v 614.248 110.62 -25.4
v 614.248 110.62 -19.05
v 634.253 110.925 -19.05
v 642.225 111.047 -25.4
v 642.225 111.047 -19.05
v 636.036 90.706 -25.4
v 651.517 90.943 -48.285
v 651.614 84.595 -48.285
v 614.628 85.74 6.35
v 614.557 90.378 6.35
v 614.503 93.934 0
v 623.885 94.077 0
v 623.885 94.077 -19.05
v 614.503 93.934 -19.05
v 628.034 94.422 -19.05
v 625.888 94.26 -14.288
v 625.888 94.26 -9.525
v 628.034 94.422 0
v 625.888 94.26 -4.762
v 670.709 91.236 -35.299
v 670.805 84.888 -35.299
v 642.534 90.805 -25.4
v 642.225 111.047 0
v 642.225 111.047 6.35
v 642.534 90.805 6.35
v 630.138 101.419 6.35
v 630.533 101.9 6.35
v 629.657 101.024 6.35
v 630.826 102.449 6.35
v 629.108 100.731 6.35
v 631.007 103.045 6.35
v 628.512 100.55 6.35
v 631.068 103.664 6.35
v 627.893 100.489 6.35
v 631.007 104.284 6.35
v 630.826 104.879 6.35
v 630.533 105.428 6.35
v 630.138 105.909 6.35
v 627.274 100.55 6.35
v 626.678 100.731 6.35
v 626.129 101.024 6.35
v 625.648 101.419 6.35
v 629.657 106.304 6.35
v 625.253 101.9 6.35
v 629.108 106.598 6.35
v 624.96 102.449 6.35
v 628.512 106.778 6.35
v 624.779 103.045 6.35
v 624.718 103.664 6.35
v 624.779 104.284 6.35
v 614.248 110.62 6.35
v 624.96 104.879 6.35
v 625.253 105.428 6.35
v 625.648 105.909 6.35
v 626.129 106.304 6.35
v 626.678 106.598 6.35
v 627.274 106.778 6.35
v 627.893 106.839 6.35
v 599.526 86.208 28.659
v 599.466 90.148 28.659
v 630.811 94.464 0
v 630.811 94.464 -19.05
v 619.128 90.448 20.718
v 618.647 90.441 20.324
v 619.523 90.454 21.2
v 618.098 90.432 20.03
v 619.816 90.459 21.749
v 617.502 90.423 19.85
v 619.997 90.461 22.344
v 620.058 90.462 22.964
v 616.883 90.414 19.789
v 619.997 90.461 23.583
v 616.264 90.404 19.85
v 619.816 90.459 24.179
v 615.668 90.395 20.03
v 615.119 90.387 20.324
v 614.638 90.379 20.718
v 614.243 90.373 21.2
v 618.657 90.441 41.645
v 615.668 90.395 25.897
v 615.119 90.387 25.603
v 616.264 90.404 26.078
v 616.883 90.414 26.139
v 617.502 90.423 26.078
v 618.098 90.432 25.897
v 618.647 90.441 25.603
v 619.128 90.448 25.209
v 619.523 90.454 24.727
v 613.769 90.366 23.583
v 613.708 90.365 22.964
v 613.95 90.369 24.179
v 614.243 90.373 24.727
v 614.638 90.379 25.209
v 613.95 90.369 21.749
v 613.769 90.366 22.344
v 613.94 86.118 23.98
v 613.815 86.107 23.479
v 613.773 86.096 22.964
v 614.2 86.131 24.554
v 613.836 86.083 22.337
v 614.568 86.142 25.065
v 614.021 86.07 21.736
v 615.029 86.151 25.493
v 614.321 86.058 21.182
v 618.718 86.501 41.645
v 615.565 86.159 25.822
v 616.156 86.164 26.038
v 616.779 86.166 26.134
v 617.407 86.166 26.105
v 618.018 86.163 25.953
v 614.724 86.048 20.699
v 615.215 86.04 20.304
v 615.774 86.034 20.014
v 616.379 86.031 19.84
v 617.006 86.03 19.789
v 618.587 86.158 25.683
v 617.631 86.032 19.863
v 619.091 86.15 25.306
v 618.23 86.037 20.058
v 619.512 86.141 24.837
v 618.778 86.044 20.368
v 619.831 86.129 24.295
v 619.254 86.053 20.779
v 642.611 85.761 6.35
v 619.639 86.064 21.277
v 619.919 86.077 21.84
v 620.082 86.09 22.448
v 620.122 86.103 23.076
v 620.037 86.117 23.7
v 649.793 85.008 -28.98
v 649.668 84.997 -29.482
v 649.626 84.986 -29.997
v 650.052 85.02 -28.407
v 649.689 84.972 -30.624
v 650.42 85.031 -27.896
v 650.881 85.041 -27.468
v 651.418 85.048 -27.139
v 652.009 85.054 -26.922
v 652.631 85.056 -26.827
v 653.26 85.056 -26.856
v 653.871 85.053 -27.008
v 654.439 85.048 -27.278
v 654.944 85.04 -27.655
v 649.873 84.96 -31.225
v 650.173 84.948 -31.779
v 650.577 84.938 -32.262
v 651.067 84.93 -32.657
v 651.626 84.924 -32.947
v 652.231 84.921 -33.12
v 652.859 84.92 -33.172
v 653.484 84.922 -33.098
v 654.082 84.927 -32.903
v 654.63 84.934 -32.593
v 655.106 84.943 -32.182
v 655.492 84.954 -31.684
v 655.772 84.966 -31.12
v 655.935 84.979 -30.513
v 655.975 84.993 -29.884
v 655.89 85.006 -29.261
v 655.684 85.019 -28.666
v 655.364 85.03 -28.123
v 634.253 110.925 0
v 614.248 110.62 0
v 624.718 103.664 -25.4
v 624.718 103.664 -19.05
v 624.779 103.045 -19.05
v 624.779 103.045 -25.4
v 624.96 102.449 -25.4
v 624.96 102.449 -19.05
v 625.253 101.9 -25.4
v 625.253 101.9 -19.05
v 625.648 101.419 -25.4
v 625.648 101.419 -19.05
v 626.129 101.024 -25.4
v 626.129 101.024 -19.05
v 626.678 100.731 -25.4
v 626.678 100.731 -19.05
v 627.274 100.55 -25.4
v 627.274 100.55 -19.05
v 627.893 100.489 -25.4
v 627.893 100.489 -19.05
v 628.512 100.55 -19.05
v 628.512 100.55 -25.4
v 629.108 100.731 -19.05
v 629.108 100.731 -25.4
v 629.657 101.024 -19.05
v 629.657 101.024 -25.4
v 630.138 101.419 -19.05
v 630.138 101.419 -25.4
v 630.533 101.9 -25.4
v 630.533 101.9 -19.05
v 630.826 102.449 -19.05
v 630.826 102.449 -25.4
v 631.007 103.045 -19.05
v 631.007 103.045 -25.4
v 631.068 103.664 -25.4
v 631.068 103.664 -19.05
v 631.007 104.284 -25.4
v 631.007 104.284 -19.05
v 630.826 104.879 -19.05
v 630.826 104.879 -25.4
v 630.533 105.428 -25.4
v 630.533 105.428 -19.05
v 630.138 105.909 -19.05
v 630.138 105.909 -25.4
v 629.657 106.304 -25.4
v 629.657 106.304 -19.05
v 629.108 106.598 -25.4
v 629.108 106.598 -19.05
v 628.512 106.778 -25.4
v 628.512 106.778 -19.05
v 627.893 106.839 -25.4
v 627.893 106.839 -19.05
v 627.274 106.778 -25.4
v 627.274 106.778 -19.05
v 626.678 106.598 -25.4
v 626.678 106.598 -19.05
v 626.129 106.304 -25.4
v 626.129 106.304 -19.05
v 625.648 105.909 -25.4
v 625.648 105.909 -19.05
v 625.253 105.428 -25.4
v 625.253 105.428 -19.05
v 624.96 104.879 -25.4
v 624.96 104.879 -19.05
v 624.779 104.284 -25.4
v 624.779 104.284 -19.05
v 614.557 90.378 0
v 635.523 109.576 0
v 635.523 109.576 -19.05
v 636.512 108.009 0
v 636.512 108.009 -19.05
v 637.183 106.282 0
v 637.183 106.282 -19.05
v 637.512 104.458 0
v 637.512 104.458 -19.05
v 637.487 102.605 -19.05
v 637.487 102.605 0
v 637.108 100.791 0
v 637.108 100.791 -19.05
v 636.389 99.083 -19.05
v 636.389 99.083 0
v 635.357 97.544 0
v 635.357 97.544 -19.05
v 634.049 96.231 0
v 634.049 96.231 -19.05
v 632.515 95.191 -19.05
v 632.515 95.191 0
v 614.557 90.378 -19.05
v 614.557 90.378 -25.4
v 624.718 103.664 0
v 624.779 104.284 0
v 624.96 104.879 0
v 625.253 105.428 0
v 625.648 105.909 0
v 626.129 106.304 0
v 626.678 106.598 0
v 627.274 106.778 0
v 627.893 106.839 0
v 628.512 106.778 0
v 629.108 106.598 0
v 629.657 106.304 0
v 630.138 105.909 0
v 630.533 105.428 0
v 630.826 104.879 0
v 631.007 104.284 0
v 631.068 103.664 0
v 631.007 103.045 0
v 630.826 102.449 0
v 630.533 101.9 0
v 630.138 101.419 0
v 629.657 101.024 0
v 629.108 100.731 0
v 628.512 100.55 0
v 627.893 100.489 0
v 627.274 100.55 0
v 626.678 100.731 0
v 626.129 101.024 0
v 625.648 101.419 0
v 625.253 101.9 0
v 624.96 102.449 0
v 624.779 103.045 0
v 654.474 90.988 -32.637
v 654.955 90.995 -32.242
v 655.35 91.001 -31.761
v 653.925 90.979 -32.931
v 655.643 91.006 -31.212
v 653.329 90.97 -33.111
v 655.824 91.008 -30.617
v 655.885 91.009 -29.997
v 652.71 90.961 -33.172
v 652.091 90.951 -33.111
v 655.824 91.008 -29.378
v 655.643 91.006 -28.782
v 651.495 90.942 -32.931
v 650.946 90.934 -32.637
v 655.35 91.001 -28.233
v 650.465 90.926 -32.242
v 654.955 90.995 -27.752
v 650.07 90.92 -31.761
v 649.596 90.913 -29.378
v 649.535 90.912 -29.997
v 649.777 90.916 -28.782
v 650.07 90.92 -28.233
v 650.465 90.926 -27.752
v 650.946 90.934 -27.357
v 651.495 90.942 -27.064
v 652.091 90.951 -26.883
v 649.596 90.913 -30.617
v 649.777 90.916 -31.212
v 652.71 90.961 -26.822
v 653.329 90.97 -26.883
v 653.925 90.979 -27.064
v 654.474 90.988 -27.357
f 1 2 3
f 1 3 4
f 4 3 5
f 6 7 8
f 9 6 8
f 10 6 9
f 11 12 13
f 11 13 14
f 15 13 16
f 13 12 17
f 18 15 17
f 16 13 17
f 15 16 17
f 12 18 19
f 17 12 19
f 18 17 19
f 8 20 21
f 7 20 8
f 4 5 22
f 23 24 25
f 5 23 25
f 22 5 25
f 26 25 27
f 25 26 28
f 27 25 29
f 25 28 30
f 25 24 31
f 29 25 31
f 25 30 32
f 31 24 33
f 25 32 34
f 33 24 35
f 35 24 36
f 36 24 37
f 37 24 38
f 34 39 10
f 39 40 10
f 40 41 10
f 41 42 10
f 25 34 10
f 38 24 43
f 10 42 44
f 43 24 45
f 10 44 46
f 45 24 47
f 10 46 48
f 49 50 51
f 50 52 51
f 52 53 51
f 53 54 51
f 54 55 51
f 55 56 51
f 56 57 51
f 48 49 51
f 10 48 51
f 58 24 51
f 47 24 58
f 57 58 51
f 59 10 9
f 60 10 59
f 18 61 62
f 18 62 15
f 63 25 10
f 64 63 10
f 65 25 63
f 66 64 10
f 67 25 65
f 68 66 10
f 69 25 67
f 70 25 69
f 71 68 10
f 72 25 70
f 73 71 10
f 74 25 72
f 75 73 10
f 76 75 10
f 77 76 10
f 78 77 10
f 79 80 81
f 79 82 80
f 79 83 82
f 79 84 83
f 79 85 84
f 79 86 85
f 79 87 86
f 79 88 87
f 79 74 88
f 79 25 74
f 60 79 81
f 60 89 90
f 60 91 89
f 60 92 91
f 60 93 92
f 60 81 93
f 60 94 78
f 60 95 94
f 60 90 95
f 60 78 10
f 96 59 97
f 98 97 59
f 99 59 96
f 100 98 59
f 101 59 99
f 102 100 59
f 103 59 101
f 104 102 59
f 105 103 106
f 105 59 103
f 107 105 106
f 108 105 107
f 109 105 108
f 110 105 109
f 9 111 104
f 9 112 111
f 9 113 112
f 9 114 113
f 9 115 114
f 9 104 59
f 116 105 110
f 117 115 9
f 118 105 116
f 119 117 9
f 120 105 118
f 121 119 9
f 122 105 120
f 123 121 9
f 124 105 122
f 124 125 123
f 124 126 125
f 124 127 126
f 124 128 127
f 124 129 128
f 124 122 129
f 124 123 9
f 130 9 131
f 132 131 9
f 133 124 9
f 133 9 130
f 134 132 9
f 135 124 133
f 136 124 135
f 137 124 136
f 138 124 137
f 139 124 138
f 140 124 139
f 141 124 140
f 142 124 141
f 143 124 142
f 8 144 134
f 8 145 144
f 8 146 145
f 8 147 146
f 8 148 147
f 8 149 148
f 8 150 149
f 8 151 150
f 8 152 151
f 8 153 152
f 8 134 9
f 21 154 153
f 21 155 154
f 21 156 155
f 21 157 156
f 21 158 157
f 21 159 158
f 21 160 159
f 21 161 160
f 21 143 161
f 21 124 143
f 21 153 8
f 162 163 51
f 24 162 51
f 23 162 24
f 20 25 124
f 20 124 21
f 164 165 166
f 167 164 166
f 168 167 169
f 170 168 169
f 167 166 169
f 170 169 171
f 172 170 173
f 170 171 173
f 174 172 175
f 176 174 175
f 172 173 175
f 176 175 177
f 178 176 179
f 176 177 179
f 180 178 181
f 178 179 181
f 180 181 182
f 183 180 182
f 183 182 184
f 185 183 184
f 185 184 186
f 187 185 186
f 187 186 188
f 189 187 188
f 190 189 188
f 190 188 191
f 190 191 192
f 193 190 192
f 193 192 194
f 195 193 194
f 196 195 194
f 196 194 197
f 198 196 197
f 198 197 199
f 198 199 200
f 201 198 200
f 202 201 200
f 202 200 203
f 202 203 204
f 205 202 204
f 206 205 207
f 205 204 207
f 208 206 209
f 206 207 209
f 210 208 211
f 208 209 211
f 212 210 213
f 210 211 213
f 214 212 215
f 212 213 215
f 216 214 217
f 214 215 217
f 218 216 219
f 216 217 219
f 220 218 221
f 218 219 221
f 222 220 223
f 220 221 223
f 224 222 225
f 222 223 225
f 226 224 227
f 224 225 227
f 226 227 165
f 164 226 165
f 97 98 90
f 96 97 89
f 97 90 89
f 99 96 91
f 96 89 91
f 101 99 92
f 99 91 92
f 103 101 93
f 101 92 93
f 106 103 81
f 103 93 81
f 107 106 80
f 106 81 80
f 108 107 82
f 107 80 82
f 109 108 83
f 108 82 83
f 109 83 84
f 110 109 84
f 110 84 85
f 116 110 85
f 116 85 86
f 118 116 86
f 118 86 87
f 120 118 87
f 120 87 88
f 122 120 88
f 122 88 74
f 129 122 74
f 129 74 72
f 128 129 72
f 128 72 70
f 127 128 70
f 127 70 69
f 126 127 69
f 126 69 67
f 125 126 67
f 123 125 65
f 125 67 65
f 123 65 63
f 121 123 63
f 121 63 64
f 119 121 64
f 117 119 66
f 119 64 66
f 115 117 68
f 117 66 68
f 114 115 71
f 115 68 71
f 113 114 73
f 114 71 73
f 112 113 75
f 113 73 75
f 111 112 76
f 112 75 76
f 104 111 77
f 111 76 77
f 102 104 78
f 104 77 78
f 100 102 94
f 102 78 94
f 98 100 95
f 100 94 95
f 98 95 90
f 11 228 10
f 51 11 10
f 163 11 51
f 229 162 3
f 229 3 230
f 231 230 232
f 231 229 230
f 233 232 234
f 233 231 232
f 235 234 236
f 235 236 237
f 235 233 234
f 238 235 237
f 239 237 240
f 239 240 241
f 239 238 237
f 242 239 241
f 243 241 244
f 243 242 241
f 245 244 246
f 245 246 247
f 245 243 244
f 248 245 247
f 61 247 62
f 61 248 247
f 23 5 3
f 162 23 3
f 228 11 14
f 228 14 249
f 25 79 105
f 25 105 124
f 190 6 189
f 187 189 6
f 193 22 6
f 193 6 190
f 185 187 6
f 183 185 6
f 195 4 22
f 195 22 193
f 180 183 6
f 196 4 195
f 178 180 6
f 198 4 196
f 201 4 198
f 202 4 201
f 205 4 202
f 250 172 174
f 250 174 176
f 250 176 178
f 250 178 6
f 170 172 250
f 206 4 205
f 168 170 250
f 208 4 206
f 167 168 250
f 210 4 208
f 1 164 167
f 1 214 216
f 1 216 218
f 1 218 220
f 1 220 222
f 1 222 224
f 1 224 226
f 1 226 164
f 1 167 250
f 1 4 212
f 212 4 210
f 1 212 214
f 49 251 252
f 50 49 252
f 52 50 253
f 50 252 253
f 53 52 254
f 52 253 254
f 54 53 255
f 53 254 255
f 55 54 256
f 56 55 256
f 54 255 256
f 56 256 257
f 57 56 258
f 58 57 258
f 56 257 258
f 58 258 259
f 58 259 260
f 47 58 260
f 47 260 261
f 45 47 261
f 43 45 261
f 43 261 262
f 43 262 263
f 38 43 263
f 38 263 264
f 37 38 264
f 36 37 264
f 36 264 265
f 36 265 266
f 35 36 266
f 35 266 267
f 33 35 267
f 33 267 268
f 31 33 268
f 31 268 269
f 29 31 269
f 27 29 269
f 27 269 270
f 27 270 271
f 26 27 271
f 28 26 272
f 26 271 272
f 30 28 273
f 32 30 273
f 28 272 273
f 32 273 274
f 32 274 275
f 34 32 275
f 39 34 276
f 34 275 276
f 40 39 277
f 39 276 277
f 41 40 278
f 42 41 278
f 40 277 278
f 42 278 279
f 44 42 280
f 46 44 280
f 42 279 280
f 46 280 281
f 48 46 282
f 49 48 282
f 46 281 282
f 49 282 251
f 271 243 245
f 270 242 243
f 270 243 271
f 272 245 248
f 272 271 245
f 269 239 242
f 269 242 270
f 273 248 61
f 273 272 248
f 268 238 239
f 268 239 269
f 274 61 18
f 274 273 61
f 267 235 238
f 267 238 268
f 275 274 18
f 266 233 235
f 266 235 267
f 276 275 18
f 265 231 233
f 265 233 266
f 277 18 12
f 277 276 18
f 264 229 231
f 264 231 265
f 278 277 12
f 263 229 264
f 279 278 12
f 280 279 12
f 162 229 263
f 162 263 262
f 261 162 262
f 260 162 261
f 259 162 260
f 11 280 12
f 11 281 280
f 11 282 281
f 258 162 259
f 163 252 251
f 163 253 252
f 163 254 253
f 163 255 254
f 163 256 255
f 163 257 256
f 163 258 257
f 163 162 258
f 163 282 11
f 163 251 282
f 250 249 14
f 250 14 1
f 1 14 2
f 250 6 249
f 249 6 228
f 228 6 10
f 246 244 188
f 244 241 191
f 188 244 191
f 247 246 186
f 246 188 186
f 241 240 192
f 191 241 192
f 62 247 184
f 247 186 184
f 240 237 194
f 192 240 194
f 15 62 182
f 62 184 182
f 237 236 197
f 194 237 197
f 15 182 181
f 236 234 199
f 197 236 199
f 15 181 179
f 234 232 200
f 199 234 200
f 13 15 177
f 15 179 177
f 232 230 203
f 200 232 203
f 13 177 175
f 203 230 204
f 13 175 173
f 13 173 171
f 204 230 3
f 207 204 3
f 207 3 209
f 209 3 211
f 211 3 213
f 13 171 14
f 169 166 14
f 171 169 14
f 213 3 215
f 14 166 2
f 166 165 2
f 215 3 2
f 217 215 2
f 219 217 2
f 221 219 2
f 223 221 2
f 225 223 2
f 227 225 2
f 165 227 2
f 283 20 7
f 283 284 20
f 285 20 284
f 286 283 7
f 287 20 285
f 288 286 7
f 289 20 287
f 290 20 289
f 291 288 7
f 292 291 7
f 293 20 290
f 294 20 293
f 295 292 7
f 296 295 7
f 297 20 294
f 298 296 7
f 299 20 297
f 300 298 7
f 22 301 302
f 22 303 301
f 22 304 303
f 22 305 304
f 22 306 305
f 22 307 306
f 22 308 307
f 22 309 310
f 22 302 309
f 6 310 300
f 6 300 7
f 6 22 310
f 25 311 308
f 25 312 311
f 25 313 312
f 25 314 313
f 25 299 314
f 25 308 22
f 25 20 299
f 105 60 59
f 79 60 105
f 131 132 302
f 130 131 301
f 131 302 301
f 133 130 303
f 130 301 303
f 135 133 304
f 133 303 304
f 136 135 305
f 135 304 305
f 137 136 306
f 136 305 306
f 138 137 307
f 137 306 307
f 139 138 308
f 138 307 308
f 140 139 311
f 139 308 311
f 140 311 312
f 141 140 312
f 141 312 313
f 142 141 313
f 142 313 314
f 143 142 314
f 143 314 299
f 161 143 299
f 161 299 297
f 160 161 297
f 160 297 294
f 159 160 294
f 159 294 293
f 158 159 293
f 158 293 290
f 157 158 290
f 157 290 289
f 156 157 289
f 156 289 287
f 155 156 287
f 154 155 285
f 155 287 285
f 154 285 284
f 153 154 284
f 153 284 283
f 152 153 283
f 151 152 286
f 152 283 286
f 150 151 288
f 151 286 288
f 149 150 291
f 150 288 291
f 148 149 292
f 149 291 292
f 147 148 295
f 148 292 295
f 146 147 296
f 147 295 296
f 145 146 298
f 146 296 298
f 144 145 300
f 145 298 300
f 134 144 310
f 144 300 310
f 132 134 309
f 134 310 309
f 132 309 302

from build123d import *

# Parameters (mm, degrees)
BOSS_EXTRUDE2_DEPTH = 19.05
BOSS_EXTRUDE3_DEPTH = 6.35
BOSS_EXTRUDE4_DEPTH = 6.35
SKETCH5_R           = 3.175
CUT_EXTRUDE1_DEPTH  = 653.553447442
SKETCH6_R           = 3.175
CUT_EXTRUDE2_DEPTH  = 653.553447442
BOSS_EXTRUDE7_DEPTH = 7.874
SKETCH12_R          = 3.175
CUT_EXTRUDE4_DEPTH  = 675.468016292
BOSS_EXTRUDE8_DEPTH = 23.1648
CUT_EXTRUDE6_DEPTH  = 429.875020033


with BuildPart() as part:
    # Sketch1 → Boss-Extrude2 (new body)
    with BuildSketch(Plane.XY):
        with BuildLine():
            Line((642.224572561, 111.046838573), (634.252545404, 110.925124722))
            ThreePointArc((634.252545404, 110.925124722), (637.340775548, 101.689054702), (630.810820972, 94.46397006))
            Line((630.810820972, 94.46397006), (628.034186285, 94.421577467))
            add(Edge.make_bspline(
                [(623.884527878, 94.077084958), (624.201469176, 94.081923896), (624.52651862, 94.107859076), (625.194071811, 94.176161637), (625.538291649, 94.218971248), (626.23780183, 94.300697743), (626.591177817, 94.339281954), (627.30622807, 94.396985819), (627.667912536, 94.41598534), (628.034186285, 94.421577467)],
                knots=[0, 0, 0, 0, 0.25, 0.25, 0.5, 0.5, 0.75, 0.75, 1, 1, 1, 1], degree=3))
            Line((623.884527878, 94.077084958), (614.502973196, 93.933850981))
            Line((614.502973196, 93.933850981), (614.557258512, 90.378265361))
            Line((614.557258512, 90.378265361), (642.533611114, 90.805397577))
            Line((642.533611114, 90.805397577), (642.224572561, 111.046838573))
        make_face()
    extrude(amount=-BOSS_EXTRUDE2_DEPTH)

    # Sketch2 → Boss-Extrude3 (add)
    with BuildSketch(Plane.XY):
        Polygon((614.557258512, 90.378265361), (614.248219959, 110.619706357), (642.224572561, 111.046838573), (642.533611114, 90.805397577), align=None)
    extrude(amount=BOSS_EXTRUDE3_DEPTH)

    # Sketch4 → Boss-Extrude4 (add)
    with BuildSketch(Plane(origin=(0, 0, -19.05), x_dir=(-1, 0, 0), z_dir=(0, 0, -1))):
        Polygon((-614.557258512, 90.378265361), (-614.248219959, 110.619706357), (-642.224572561, 111.046838573), (-642.533611114, 90.805397577), align=None)
    extrude(amount=BOSS_EXTRUDE4_DEPTH)

    # Sketch5 → Cut-Extrude1 (cut, through all)
    with BuildSketch(Plane(origin=(0, 0, 0), x_dir=(-1, 0, 0), z_dir=(0, 0, -1))):
        with Locations((-627.893070479, 103.664395923)):
            Circle(SKETCH5_R)
    extrude(amount=-CUT_EXTRUDE1_DEPTH, mode=Mode.SUBTRACT)

    # Sketch6 → Cut-Extrude2 (cut, through all)
    with BuildSketch(Plane.XY.offset(-19.05)):
        with Locations(Location((627.893070479, 103.664395923, 0), (0, 0, 180))):
            Circle(SKETCH6_R)
    extrude(amount=-CUT_EXTRUDE2_DEPTH, mode=Mode.SUBTRACT)

    # Sketch11 → Boss-Extrude7 (add)
    with BuildSketch(Plane(origin=(-1.236319125, 80.976565327, 0), x_dir=(0.9998834703189056, 0.015265837121568253, 0), z_dir=(0.015265837121568255, -0.9998834703189057, 0))):
        Polygon((615.865344229, 6.35), (600.772109003, 28.658661472), (619.965955333, 41.644525188), (643.844957287, 6.35), (672.023174673, -35.299010508), (652.829328343, -48.284874224), align=None)
    extrude(amount=BOSS_EXTRUDE7_DEPTH)

    # Sketch12 → Cut-Extrude4 (cut, through all)
    with BuildSketch(Plane(origin=(-1.236319125, 80.976565327, 0), x_dir=(0.9998834703189056, 0.015265837121568083, 0), z_dir=(-0.015265837121568085, 0.9998834703189057, 0))):
        with Locations(Location((618.191262939, -22.963551046, 0), (0, 0, 180))):
            Circle(SKETCH12_R)
        with Locations(Location((654.022628802, 29.997248883, 0), (0, 0, 180))):
            Circle(SKETCH12_R)
    extrude(amount=-CUT_EXTRUDE4_DEPTH, mode=Mode.SUBTRACT)

    # Sketch13 → Boss-Extrude8 (add)
    with BuildSketch(Plane(origin=(444.569112267, 6.787510604, 300.814470562), x_dir=(0.5602970950459771, 0.008554401034284214, -0.8282475399939222), z_dir=(0.8281510245722196, 0.012643892041886809, 0.5603623938970352))):
        Polygon((312.913631323, 73.066855862), (405.705293775, 70.658703567), (405.812833532, 73.1120026), (312.913631323, 73.1120026), align=None)
    extrude(amount=-BOSS_EXTRUDE8_DEPTH)

    # Sketch14 → Cut-Extrude6 (cut, through all)
    with BuildSketch(Plane(origin=(444.569112267, 6.787510604, 300.814470562), x_dir=(0.5602970950459771, 0.008554401034284214, -0.8282475399939222), z_dir=(0.8281510245722196, 0.012643892041886809, 0.5603623938970352))):
        Polygon((312.913631323, 73.066855862), (312.913631323, 77.045511862), (405.812833532, 74.637359567), (405.705293775, 70.658703567), align=None)
    extrude(amount=-CUT_EXTRUDE6_DEPTH, mode=Mode.SUBTRACT)


with BuildPart() as body_2:
    # of the pieces the cut leaves, the one that is kept (cut_extrude6_keep)
    add(part.part.solids().sort_by_distance((634.252545404, 110.925124722, 0))[0])


solid = body_2.part
